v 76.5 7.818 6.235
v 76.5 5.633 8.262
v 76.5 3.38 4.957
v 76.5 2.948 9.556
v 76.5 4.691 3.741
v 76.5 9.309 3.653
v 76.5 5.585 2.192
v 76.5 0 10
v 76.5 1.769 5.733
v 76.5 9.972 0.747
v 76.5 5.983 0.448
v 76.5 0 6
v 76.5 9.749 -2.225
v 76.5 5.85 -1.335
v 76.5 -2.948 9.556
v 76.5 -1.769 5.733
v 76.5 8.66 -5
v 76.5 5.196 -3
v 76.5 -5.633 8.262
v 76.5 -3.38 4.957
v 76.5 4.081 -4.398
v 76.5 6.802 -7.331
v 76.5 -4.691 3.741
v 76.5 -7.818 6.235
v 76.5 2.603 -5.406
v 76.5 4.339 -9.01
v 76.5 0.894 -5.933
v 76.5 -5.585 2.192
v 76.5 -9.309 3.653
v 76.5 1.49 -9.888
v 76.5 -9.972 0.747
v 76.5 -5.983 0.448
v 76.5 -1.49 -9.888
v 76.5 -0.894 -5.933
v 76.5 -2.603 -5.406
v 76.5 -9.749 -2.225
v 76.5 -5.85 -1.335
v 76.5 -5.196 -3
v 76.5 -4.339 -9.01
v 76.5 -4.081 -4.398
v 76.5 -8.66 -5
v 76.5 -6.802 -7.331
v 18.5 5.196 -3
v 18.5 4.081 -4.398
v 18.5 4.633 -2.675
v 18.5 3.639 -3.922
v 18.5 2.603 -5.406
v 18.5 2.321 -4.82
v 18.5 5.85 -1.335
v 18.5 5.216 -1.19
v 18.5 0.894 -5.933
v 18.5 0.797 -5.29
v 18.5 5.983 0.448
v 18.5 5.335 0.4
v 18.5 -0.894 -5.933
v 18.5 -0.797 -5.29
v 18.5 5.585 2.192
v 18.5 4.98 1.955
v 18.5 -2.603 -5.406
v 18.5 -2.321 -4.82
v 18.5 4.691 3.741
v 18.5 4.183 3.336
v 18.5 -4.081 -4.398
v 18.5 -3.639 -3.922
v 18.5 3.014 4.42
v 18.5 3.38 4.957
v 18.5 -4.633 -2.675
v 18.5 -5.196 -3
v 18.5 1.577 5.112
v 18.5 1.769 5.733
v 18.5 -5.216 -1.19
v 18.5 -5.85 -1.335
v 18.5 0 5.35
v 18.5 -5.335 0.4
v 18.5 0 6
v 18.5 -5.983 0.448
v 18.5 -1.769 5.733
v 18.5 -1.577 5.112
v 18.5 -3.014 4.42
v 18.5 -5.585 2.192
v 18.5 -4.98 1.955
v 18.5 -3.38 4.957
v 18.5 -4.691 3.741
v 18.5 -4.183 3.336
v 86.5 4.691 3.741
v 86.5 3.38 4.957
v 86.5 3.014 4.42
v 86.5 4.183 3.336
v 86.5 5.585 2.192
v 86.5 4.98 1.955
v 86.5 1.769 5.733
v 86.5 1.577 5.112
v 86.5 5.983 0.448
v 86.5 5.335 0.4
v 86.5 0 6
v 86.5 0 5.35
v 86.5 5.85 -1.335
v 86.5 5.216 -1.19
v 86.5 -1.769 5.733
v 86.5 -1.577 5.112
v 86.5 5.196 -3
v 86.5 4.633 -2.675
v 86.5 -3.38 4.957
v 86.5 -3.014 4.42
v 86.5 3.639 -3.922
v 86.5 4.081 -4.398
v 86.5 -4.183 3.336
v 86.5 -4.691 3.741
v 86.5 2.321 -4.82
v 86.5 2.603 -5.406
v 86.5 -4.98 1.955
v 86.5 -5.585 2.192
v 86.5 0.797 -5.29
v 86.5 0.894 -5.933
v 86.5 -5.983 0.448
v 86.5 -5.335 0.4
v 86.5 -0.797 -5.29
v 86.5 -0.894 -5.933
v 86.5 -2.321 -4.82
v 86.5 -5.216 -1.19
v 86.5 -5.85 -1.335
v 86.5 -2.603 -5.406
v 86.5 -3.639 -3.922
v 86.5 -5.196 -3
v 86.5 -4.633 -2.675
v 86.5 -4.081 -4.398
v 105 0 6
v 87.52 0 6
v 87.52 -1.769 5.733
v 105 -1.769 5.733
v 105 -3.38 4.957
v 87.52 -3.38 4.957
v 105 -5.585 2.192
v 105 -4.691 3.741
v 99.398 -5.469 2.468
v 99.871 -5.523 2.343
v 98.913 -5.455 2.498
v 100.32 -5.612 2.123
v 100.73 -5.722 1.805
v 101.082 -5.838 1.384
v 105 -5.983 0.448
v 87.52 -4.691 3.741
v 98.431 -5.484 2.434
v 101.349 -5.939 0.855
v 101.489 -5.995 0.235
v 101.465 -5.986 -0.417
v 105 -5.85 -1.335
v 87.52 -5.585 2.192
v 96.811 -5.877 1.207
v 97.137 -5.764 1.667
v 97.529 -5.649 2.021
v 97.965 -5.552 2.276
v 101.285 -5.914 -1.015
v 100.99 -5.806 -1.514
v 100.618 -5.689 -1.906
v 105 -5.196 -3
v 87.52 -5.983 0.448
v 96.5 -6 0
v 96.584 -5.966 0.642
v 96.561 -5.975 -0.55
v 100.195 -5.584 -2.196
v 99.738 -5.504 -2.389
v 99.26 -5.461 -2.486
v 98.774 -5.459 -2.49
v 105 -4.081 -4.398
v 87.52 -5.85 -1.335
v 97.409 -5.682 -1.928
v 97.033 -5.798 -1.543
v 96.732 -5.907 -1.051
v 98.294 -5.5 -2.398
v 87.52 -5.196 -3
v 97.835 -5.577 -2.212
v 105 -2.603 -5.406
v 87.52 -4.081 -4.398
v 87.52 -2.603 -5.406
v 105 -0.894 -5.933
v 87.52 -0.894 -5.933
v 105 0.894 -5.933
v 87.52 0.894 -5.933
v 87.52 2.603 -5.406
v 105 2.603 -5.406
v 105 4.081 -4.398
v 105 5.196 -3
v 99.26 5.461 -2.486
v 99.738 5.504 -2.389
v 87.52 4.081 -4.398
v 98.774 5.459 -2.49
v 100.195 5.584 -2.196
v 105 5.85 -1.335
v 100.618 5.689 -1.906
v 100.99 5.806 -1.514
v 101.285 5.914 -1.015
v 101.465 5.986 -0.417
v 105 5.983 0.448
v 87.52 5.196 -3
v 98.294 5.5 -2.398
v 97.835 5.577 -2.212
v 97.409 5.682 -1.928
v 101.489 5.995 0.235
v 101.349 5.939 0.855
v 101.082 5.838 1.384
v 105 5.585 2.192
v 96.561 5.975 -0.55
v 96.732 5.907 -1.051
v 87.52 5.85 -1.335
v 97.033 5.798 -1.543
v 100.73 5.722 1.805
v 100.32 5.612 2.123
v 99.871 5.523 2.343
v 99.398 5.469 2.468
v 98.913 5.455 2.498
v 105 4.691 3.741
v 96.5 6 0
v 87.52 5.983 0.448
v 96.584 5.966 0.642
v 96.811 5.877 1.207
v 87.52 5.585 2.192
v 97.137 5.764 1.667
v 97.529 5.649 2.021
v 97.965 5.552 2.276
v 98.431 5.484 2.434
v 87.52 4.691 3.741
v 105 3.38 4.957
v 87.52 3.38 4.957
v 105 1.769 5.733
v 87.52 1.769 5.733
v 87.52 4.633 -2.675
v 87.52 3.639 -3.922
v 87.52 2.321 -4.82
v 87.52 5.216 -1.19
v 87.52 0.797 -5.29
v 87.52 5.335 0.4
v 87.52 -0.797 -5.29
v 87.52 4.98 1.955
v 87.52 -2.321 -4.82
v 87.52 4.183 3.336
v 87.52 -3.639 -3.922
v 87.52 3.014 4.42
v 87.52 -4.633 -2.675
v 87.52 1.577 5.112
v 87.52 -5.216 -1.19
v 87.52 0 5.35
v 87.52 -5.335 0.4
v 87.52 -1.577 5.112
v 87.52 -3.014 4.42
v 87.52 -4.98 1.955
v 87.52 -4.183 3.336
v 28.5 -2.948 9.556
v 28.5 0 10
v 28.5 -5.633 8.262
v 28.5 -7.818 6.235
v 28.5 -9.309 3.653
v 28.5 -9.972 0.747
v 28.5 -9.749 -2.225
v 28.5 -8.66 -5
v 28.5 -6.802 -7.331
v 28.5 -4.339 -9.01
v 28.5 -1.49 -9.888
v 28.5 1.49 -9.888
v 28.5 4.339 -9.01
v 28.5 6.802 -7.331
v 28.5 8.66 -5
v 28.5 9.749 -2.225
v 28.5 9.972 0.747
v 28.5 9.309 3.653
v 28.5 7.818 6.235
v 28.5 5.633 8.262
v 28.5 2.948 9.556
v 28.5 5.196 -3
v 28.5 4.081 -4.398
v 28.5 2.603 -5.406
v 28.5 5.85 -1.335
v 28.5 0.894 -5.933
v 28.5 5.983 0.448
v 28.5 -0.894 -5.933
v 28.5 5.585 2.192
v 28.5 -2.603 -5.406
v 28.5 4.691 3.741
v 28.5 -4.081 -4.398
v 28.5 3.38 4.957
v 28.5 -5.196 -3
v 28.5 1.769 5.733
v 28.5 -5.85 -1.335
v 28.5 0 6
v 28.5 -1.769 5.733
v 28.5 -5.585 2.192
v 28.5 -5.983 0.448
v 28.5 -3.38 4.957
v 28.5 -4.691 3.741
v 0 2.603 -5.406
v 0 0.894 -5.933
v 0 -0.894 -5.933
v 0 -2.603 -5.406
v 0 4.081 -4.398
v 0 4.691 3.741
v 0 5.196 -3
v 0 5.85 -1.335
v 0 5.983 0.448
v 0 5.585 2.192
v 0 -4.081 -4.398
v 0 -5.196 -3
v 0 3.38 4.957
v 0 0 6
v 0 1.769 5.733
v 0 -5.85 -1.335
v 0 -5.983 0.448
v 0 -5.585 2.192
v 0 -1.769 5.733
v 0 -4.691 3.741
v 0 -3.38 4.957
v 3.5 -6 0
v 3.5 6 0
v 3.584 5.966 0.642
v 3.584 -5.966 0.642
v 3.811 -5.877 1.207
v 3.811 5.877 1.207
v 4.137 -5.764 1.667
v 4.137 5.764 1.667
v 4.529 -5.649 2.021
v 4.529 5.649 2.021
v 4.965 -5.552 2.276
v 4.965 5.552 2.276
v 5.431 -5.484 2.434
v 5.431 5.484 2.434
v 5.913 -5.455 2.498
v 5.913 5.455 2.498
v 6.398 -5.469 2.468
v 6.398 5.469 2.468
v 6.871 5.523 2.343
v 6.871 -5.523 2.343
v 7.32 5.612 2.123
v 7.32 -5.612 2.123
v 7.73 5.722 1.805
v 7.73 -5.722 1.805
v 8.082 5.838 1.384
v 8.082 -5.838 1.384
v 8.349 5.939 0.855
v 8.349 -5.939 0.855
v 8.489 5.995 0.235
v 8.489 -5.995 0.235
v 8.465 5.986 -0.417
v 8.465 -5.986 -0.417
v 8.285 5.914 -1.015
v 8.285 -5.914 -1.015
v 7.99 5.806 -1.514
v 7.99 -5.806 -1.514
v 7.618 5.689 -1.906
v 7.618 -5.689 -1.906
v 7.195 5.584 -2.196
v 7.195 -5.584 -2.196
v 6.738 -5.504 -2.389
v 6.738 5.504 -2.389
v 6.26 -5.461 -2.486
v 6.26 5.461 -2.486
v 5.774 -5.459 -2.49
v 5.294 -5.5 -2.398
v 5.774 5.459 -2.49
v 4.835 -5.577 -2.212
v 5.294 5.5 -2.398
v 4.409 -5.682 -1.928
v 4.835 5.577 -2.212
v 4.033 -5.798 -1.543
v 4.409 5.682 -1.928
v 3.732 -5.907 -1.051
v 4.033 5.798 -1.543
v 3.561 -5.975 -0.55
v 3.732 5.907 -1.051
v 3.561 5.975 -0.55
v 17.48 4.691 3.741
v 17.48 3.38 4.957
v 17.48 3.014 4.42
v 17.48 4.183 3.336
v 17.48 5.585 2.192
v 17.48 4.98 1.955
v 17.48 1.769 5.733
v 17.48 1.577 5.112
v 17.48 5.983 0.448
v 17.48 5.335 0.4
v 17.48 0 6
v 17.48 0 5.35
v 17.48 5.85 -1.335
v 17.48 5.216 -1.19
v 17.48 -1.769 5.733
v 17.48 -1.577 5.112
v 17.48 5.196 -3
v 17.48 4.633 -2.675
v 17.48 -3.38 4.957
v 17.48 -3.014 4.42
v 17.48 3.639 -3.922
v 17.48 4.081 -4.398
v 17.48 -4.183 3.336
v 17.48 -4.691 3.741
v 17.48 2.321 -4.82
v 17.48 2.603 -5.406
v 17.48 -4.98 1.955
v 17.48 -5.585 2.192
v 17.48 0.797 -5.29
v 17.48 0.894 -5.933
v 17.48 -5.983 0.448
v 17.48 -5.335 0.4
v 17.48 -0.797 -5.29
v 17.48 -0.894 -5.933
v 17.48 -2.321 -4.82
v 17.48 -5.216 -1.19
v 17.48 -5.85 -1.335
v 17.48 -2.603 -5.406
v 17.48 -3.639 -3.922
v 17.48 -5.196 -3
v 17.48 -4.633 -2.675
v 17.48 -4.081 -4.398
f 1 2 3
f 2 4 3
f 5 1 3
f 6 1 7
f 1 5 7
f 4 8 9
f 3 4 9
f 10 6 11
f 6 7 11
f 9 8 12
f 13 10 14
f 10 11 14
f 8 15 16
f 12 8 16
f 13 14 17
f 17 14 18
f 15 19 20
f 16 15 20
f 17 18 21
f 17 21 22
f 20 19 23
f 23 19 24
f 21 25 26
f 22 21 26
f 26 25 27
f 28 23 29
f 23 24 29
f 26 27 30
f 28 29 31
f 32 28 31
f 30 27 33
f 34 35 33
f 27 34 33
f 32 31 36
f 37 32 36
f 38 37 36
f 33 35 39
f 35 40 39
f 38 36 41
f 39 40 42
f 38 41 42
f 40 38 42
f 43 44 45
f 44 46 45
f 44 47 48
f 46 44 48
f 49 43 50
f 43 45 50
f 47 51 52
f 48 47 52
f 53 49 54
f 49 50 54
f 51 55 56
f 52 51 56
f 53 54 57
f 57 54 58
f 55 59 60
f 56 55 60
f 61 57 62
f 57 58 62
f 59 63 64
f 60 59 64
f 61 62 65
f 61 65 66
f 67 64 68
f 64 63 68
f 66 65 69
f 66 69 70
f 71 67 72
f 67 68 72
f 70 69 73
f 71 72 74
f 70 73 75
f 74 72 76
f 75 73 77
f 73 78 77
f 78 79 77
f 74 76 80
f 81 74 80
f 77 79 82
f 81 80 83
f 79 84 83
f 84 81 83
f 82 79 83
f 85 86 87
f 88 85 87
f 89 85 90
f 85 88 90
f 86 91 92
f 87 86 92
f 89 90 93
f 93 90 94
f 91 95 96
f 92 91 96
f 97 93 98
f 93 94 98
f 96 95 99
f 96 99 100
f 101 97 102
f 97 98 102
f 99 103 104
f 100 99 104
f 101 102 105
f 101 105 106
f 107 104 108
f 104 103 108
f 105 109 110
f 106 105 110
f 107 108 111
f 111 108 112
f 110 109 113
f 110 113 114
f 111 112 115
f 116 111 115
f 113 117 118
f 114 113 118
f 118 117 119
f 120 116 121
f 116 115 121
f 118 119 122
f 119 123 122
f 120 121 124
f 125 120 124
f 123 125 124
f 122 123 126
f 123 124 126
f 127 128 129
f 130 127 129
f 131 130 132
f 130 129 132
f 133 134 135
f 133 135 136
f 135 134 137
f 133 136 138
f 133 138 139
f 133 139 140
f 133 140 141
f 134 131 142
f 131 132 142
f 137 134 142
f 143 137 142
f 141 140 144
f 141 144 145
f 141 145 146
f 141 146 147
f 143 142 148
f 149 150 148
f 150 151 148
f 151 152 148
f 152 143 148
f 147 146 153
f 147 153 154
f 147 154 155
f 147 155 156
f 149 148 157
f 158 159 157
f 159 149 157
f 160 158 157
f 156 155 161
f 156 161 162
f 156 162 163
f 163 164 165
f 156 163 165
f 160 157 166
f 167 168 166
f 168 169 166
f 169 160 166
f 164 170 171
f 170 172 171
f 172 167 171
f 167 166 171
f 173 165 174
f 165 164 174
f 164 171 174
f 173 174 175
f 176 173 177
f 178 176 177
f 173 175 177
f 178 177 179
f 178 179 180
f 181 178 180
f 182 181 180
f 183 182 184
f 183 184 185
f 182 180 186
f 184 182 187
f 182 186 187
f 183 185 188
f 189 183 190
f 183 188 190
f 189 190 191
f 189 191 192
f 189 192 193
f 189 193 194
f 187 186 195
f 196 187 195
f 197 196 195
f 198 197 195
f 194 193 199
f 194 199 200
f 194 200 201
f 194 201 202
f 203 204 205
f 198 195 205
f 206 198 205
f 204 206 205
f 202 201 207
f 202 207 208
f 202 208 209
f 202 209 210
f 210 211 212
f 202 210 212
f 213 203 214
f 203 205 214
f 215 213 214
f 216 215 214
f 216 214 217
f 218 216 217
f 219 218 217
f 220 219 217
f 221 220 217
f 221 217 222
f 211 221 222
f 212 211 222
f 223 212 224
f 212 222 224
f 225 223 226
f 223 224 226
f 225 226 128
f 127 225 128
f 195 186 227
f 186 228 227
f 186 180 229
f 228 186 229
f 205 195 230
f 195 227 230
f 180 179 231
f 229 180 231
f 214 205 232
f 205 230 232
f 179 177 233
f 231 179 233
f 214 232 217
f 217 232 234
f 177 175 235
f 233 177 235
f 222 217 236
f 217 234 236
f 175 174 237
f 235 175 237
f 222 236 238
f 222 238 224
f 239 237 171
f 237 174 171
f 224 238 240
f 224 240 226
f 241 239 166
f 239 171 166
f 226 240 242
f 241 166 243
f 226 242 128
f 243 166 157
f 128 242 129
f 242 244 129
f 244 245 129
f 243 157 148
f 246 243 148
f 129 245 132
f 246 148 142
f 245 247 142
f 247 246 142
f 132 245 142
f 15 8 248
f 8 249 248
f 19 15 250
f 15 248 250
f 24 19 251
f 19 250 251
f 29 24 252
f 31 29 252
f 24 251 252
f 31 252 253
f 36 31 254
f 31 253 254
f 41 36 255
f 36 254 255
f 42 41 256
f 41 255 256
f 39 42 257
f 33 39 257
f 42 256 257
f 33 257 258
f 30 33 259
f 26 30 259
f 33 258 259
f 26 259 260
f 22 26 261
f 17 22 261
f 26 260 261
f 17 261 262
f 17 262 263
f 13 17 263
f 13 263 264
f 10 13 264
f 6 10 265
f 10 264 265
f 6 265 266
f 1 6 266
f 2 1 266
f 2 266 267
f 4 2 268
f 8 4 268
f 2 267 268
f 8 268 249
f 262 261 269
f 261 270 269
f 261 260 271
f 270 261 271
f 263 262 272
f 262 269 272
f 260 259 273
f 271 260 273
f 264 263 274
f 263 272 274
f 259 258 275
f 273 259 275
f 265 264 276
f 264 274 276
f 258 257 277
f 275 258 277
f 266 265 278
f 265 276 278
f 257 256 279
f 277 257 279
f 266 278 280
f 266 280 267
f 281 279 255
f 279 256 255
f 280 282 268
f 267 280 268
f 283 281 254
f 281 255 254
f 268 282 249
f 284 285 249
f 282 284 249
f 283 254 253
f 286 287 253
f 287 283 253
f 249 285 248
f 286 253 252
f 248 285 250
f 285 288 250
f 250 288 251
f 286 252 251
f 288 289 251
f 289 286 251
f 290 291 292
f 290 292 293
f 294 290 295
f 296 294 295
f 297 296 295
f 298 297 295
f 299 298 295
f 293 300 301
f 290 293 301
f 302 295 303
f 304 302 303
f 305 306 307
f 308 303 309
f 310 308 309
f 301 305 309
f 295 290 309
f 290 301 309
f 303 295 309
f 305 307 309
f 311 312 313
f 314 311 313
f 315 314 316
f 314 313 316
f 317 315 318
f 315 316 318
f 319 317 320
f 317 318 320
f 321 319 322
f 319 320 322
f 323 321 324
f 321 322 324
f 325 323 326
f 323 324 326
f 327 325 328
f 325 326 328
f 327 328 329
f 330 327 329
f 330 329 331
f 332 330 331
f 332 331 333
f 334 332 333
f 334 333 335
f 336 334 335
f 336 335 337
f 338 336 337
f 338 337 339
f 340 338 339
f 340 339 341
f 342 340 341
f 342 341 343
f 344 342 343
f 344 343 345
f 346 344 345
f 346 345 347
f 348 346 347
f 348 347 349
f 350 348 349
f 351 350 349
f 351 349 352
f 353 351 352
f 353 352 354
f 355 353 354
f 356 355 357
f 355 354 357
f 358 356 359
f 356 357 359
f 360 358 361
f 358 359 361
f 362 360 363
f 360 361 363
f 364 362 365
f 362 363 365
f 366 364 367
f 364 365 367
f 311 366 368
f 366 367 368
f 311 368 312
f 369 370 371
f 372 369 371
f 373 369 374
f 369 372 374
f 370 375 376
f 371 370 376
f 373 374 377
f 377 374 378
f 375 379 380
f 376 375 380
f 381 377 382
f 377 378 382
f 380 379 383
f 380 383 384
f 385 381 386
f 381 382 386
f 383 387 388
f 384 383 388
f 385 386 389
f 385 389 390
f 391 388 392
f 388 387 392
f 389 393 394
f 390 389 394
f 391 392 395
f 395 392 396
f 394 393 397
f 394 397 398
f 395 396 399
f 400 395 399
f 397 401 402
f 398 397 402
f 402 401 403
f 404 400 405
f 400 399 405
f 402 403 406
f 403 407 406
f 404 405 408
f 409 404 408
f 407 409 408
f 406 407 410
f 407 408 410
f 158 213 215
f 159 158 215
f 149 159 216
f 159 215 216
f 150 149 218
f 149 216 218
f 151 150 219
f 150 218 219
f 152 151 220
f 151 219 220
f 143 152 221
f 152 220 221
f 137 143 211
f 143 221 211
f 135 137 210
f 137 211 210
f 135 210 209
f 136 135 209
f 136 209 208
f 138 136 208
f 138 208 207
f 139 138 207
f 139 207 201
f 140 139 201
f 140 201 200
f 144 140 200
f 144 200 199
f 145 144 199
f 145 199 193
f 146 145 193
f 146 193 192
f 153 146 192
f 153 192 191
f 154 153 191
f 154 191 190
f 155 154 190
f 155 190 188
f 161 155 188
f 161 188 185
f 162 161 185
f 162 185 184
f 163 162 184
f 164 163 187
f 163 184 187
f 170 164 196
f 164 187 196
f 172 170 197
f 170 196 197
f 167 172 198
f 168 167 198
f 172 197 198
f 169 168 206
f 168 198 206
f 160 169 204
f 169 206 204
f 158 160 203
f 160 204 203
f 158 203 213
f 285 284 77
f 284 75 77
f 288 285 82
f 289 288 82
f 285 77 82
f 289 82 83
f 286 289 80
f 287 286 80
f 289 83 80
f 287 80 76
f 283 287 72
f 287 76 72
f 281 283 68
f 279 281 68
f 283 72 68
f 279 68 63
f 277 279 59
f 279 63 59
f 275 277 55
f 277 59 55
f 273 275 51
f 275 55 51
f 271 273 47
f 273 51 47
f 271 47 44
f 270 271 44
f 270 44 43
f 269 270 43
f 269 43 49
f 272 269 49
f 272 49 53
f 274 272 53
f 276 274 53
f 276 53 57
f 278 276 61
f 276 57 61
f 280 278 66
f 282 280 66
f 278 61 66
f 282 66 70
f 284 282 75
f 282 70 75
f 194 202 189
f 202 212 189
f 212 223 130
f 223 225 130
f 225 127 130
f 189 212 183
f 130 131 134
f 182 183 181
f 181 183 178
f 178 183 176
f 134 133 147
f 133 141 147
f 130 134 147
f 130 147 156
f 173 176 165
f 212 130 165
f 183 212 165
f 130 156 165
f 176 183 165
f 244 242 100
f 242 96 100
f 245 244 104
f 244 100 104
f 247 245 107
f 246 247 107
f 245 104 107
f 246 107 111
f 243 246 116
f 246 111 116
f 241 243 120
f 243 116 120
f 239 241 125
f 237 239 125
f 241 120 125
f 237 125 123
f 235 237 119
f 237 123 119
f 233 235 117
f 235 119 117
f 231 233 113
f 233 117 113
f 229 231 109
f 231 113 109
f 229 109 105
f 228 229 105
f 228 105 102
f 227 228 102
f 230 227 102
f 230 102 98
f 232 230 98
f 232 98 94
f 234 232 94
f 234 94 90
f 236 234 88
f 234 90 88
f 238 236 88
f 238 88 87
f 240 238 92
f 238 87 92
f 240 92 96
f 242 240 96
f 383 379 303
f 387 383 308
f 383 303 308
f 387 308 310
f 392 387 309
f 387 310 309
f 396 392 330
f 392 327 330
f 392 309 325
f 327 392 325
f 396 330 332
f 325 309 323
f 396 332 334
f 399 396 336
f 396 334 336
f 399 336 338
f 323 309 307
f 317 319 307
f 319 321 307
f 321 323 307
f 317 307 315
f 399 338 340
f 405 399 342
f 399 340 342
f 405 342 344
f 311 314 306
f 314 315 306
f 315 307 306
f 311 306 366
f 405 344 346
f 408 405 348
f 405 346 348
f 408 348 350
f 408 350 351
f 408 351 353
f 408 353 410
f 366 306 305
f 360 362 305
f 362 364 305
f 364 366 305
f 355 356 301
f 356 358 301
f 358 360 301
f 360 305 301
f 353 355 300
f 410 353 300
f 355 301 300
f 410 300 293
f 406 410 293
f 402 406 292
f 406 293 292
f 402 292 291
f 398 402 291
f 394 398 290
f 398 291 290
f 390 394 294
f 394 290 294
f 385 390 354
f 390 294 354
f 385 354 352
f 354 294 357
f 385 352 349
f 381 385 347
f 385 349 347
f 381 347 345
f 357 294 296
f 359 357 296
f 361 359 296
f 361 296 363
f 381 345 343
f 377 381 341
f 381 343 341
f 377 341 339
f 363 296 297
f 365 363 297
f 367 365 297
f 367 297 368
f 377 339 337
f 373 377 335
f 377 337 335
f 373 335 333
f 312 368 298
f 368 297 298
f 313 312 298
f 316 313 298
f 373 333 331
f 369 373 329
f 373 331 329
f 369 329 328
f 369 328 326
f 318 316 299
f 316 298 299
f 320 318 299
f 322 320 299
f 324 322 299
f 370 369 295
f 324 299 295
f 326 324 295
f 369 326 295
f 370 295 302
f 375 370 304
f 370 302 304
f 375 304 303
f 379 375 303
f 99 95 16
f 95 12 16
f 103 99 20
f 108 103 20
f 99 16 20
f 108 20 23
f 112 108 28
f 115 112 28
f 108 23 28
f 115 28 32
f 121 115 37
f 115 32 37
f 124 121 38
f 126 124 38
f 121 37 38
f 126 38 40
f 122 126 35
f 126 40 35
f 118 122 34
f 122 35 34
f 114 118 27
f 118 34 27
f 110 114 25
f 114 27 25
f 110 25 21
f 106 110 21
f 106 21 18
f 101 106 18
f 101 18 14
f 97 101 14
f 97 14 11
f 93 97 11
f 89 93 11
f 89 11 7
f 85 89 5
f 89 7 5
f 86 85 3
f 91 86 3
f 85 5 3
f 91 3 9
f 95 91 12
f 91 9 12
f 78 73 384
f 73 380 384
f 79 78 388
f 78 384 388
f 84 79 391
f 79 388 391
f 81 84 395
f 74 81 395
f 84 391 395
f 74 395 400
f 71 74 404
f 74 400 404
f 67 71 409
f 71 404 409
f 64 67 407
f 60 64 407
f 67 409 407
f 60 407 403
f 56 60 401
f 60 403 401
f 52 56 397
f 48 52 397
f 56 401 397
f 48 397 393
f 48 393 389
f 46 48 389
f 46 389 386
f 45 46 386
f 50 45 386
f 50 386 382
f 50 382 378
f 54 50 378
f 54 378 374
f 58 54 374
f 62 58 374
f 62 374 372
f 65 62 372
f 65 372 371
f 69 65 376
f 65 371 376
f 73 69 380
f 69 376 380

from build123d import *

# Parameters (mm, degrees)
F4_D     = 5
F4_DEPTH = 25


with BuildPart() as f1:
    # F0 (on Front) → F1 (revolve)
    with BuildSketch(Plane.XZ):
        Polygon((0, 6), (0, 0), (105, 0), (105, 6), (87.52, 6), (87.52, 5.35), (86.5, 5.35), (86.5, 6), (76.5, 6), (76.5, 10), (28.5, 10), (28.5, 6), (18.5, 6), (18.5, 5.35), (17.48, 5.35), (17.48, 6), align=None)
    revolve(axis=Axis((52.5, 0, 0), (1, 0, 0)))

    # F4
    with Locations(Plane.XZ.offset(6)):
        with Locations((6, 0), (99, 0)):
            Hole(F4_D / 2, depth=F4_DEPTH)


solid = f1.part
